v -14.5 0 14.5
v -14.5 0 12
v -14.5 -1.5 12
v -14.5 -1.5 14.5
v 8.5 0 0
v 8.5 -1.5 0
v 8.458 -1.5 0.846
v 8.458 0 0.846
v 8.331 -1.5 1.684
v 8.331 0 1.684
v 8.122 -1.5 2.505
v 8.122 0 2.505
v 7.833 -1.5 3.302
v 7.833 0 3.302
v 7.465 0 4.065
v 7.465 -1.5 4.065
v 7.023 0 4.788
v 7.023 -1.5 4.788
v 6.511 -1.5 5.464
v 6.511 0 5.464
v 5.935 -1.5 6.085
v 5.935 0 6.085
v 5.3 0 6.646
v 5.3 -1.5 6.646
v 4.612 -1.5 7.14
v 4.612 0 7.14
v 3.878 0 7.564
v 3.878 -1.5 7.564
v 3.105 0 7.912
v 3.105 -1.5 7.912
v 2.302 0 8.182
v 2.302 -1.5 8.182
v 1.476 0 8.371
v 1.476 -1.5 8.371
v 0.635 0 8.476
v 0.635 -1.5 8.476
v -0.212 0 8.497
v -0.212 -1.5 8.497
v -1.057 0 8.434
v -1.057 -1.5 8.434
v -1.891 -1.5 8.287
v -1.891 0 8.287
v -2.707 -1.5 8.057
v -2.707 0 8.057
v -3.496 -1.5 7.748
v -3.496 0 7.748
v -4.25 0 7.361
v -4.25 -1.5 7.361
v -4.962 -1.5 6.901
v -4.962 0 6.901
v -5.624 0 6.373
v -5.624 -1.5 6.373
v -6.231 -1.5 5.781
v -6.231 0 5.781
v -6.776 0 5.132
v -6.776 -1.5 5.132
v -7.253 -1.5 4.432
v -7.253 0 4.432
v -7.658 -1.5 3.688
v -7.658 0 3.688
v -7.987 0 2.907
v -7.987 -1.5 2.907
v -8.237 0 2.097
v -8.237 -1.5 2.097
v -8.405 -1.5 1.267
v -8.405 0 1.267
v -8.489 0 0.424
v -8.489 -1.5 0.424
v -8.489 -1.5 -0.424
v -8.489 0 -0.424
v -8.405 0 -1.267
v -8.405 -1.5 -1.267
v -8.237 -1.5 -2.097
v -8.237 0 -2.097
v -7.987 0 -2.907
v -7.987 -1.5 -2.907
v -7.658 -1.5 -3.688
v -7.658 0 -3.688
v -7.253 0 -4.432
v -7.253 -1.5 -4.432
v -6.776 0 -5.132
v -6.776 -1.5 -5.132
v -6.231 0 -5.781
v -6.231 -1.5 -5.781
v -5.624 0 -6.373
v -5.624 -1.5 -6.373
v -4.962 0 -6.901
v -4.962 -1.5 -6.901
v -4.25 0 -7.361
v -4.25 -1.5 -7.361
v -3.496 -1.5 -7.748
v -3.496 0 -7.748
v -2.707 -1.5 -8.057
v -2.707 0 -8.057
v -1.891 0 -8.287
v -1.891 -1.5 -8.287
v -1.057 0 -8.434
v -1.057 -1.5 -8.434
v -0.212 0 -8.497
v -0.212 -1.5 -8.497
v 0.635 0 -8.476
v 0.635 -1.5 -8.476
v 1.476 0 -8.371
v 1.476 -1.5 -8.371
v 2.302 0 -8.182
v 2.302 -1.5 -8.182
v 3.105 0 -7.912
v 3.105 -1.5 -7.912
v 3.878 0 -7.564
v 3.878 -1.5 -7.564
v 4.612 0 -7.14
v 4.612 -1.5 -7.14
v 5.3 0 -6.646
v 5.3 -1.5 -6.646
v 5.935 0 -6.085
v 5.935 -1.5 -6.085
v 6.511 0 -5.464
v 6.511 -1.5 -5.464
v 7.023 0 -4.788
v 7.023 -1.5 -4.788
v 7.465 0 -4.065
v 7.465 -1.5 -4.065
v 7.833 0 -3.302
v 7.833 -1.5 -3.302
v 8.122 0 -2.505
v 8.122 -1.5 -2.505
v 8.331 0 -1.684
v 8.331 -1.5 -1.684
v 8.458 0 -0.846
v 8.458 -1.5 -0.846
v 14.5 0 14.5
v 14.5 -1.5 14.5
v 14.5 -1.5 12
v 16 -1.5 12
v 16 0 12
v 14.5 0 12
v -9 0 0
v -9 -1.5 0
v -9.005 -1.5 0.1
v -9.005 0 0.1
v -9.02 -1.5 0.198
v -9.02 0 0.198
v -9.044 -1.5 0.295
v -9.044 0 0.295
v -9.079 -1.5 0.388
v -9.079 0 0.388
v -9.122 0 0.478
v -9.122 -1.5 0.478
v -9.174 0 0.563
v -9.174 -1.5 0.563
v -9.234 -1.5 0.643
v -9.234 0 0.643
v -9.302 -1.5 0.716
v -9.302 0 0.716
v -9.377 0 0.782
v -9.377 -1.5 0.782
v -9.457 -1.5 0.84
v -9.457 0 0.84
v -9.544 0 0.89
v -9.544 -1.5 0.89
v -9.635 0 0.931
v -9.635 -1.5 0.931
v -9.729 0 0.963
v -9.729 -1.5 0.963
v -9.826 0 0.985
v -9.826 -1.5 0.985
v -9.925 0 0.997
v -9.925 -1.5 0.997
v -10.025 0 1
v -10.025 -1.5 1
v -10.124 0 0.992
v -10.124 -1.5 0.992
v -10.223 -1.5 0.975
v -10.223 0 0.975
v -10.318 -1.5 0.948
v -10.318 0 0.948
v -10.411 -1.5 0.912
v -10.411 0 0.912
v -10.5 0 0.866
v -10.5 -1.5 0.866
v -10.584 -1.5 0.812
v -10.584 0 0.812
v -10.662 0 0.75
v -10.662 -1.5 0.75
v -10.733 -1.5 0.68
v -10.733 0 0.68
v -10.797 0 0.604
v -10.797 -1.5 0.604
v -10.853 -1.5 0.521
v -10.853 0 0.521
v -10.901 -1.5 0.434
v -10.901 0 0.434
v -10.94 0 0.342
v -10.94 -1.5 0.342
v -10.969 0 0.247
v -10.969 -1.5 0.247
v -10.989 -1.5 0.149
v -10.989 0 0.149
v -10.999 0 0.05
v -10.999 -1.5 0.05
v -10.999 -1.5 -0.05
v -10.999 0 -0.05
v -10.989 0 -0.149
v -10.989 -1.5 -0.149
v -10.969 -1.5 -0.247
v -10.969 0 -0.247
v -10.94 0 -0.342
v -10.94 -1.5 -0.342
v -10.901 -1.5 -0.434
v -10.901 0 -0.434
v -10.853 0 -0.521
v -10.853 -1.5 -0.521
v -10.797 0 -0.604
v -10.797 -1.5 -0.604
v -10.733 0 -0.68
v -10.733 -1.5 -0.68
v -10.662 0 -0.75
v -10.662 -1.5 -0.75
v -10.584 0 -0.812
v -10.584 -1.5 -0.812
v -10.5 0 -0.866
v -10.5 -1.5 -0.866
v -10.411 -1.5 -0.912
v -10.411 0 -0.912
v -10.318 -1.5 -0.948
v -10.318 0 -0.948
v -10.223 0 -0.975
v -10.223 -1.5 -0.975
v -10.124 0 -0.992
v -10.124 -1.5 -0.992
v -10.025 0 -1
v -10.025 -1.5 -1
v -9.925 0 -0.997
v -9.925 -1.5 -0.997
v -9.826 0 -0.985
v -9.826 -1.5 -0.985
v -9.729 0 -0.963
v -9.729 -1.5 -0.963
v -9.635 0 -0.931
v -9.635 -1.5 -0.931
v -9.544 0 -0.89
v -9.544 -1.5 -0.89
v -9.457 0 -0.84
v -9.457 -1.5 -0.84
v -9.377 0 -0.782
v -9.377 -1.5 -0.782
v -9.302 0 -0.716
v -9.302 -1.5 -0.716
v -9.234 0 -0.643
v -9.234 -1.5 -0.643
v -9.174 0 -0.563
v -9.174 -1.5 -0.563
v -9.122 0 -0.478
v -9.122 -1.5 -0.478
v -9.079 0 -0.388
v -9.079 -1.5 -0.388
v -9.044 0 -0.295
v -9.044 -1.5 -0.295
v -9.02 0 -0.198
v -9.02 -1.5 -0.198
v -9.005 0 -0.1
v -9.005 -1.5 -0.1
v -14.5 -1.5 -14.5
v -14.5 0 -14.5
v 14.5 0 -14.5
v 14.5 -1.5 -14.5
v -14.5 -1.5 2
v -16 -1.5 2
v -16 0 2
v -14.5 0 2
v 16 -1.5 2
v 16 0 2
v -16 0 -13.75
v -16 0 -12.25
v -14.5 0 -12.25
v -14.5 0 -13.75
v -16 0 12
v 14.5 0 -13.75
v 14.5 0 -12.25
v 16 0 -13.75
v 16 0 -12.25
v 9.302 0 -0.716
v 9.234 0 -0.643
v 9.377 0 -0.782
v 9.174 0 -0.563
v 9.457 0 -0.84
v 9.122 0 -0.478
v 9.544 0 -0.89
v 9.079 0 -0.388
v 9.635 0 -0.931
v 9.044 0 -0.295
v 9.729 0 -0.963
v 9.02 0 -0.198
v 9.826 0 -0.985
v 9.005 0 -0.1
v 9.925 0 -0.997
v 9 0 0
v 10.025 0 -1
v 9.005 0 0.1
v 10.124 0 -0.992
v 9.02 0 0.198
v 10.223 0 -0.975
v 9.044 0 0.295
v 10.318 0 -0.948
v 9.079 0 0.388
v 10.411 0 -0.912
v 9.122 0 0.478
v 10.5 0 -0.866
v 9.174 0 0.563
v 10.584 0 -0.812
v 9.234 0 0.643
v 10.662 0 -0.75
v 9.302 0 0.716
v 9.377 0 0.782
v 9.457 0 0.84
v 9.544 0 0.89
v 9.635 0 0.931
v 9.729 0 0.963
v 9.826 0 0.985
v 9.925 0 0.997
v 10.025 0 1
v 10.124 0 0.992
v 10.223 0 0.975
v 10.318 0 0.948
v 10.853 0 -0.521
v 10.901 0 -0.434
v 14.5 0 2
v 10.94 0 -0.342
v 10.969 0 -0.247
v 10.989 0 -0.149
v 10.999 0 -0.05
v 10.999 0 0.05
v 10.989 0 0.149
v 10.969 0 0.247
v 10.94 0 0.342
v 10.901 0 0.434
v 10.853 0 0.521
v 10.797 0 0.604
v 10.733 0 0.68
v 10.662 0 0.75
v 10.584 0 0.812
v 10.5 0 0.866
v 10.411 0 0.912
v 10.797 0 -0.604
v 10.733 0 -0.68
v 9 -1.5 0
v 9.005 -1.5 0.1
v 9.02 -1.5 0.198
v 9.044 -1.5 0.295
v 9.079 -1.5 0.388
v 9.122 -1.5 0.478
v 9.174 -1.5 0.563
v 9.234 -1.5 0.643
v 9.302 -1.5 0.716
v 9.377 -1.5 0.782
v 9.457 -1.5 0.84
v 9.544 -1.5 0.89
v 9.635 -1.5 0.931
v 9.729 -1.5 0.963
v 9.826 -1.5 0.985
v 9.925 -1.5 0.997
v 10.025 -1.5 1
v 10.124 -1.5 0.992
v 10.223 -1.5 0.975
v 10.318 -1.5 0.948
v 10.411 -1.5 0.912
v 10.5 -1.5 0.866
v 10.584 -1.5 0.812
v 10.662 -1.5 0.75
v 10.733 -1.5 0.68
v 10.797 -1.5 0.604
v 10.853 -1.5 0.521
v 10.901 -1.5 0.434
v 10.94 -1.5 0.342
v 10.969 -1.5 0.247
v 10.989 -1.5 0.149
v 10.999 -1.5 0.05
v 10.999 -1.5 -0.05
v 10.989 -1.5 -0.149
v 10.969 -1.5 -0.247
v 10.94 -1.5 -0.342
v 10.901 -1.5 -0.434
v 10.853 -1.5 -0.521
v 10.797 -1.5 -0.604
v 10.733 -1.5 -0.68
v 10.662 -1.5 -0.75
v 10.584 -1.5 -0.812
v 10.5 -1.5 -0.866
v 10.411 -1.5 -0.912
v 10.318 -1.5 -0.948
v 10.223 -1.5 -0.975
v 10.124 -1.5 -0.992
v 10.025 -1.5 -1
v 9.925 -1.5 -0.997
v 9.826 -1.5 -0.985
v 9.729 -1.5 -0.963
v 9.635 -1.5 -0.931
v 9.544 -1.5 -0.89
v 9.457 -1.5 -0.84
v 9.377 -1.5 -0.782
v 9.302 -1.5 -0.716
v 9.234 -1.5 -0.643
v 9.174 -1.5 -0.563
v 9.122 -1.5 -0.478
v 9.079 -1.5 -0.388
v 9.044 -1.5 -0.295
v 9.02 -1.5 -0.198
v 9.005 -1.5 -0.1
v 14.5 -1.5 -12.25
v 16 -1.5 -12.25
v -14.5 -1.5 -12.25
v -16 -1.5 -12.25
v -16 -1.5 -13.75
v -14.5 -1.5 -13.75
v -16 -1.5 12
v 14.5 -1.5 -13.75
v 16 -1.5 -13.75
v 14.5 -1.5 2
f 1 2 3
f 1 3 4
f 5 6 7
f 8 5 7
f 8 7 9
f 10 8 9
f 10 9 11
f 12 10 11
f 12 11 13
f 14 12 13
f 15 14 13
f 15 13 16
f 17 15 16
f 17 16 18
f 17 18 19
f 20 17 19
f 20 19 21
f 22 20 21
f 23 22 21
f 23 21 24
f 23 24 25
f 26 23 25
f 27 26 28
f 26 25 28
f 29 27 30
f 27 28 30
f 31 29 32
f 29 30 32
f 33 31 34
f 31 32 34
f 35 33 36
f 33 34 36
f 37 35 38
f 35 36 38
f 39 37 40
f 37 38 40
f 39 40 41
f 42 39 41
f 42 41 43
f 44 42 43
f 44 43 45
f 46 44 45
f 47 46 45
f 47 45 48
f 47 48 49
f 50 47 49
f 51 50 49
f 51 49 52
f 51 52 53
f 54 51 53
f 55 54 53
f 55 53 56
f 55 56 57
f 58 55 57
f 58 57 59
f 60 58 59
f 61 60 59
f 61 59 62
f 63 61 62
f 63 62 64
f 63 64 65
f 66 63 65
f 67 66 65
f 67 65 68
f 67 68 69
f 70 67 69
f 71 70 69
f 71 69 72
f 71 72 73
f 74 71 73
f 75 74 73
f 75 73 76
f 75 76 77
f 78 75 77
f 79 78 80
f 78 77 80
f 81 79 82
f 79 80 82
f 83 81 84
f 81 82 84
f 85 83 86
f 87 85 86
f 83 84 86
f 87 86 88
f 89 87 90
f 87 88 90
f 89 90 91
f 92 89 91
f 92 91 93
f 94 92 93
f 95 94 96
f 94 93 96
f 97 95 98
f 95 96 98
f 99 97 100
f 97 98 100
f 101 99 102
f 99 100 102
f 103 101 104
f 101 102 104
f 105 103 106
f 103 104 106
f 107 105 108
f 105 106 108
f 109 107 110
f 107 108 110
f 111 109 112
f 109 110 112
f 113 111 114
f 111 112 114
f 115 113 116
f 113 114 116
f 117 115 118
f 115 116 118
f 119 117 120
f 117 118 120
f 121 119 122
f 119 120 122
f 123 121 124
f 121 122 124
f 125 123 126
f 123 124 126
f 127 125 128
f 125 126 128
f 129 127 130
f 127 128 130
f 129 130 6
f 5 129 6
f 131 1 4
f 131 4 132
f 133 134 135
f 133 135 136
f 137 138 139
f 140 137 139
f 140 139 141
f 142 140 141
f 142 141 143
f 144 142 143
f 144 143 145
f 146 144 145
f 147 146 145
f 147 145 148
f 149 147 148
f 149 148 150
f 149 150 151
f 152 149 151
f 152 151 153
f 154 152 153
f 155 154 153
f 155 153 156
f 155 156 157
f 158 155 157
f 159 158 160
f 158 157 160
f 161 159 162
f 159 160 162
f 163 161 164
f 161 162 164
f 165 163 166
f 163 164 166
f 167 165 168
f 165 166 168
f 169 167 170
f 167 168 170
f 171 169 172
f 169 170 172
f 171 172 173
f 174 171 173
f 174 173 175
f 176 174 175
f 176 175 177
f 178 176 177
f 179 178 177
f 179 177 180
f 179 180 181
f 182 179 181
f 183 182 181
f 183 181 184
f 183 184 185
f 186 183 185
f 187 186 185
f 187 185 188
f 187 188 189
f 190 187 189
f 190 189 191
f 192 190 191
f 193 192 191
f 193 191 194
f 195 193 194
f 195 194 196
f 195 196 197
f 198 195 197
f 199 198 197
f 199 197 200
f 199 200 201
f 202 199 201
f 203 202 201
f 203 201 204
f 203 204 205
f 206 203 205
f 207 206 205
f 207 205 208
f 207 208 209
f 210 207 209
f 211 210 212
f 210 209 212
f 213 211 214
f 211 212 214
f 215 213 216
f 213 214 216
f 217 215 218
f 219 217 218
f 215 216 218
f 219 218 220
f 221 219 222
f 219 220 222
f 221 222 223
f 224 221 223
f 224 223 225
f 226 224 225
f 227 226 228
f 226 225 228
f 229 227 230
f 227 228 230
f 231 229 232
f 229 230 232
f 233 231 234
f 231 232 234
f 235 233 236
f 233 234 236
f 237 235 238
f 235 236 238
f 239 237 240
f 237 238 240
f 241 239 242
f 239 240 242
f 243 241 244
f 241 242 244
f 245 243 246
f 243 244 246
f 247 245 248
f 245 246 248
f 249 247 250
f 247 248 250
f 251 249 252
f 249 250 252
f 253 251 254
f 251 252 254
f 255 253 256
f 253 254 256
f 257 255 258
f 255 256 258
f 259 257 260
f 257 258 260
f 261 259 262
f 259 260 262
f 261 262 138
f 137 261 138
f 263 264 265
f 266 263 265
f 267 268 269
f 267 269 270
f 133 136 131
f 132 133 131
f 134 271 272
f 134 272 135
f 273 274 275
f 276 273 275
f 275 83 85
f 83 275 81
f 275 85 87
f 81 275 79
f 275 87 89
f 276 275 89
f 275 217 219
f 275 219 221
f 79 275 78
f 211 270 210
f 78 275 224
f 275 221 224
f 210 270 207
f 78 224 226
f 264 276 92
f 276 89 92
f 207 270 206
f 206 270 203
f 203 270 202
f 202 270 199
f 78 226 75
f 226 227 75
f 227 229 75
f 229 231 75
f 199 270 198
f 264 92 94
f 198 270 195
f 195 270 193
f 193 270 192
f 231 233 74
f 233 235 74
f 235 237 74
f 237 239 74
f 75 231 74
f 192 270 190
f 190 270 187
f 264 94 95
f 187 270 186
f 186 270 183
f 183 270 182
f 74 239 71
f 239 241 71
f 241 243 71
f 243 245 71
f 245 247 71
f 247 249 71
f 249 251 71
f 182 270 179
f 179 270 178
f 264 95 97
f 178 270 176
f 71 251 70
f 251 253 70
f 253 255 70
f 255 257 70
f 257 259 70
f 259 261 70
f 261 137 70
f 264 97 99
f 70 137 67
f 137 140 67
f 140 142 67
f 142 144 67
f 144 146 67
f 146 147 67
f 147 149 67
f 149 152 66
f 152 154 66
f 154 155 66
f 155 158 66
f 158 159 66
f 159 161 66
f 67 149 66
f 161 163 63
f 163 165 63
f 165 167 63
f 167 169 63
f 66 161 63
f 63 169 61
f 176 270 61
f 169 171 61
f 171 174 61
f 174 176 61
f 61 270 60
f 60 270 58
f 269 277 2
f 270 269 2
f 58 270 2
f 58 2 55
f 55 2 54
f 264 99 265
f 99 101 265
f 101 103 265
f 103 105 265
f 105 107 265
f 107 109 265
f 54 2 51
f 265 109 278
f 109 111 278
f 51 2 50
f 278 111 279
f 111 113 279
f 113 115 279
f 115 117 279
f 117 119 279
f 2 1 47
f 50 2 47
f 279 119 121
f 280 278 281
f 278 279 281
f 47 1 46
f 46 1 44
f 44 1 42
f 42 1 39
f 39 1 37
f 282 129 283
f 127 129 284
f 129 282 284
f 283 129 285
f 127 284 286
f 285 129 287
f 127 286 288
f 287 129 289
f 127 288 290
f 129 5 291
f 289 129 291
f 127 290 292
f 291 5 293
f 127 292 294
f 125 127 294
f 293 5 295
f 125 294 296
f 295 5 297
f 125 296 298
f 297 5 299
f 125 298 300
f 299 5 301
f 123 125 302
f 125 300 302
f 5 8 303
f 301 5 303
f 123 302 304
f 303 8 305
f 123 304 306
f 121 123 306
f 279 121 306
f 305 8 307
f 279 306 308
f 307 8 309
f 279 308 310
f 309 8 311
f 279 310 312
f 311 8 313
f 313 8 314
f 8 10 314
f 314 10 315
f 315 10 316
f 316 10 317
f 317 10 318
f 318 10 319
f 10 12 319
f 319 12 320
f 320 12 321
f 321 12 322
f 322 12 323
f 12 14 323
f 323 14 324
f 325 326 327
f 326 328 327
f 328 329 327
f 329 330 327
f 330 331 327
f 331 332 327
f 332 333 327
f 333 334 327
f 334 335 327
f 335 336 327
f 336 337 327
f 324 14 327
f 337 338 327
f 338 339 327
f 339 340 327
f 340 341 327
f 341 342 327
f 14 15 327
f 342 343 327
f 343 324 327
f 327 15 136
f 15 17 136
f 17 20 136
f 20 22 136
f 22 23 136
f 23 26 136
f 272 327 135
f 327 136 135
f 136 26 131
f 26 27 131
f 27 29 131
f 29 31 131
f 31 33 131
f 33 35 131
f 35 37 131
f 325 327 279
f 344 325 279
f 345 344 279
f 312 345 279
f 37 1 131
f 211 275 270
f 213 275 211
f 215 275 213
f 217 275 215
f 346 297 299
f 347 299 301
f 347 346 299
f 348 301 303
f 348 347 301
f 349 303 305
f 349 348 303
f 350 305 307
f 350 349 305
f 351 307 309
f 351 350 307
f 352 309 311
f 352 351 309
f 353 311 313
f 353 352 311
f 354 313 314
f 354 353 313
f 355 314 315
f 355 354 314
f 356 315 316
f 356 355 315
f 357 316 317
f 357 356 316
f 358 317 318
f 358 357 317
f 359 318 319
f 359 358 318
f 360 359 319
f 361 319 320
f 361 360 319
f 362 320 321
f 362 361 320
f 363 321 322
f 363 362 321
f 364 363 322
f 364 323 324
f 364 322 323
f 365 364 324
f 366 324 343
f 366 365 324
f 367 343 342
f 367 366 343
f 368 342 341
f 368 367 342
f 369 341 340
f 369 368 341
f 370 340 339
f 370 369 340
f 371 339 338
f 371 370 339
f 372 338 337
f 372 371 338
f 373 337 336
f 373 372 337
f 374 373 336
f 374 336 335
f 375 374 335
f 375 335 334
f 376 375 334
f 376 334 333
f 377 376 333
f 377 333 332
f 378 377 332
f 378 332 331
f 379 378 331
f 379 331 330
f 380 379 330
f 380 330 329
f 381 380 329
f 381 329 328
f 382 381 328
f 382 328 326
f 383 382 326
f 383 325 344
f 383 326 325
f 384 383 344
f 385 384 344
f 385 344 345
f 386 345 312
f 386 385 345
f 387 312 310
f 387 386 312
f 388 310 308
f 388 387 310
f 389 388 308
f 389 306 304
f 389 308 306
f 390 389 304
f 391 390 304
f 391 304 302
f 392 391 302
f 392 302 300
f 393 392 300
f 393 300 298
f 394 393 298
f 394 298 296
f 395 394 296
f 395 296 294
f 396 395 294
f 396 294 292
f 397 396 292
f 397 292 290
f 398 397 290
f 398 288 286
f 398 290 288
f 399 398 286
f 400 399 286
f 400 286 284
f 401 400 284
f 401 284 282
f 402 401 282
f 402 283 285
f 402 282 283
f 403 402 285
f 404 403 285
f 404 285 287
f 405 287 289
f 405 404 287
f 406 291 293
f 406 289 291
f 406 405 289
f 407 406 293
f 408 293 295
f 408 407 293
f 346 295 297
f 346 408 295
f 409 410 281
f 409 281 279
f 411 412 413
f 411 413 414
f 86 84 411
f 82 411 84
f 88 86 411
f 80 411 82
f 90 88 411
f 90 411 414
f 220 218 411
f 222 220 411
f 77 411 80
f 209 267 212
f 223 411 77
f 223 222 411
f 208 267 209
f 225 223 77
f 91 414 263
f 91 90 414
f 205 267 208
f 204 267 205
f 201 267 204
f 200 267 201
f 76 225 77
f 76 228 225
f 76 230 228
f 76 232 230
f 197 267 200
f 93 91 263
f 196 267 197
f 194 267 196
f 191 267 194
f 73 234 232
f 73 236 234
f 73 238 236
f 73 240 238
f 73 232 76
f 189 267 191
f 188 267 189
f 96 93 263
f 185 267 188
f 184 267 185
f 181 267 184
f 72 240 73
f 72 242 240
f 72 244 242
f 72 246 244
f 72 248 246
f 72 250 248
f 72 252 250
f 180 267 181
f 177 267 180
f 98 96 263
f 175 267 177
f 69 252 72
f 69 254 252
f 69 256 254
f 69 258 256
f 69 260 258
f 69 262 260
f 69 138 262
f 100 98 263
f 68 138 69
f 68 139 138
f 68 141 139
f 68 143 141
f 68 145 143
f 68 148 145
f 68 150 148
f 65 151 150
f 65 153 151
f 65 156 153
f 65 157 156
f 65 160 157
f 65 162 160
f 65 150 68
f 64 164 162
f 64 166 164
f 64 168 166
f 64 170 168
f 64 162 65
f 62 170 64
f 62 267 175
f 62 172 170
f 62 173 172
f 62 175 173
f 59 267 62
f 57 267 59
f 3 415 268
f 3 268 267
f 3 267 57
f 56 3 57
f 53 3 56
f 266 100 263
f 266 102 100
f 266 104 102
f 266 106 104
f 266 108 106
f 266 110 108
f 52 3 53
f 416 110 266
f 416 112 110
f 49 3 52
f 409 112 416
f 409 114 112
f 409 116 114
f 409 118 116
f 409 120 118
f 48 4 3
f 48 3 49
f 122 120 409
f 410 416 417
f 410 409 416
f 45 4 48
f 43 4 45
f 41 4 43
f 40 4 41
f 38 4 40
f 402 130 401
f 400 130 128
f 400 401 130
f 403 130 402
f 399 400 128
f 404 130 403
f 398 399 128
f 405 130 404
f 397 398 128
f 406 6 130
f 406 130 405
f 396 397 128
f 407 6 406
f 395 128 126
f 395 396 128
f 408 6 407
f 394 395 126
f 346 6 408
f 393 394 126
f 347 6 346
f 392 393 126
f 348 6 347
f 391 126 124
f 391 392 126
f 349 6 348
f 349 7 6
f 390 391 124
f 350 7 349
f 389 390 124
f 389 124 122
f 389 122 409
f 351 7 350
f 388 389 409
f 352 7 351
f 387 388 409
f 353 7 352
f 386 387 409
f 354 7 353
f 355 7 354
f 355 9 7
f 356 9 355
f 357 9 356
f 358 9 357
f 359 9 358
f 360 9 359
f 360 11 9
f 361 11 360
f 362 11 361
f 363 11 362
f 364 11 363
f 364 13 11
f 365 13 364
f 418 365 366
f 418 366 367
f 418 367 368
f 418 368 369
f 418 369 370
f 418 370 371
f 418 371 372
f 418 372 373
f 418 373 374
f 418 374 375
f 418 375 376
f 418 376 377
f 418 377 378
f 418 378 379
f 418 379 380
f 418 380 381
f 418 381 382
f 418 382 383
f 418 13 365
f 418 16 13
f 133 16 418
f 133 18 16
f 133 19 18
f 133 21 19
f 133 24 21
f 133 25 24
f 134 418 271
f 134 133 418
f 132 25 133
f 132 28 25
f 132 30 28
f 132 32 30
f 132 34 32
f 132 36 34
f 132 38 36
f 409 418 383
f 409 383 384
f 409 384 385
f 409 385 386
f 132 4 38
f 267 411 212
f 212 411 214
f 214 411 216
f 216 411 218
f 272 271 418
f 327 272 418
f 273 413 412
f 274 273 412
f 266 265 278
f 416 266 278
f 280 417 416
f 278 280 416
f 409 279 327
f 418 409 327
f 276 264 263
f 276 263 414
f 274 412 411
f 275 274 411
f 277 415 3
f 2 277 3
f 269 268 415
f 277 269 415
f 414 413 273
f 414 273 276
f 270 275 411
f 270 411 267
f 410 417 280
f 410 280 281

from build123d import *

# Parameters (mm, degrees)
F0_W     = 29
F0_H     = 29
F1_DEPTH = 1.5
F2_R     = 8.5
F3_DEPTH = 1.501
F4_R     = 1
F5_DEPTH = 1.501
F6_W     = 1.5
F6_H     = 1.5
F6_H_2   = 10
F7_DEPTH = 1.5


# Not quite as in the source:
# - a pattern or mirror of a feature is missing from the dataset's text; its kind, count and spacing are read off the source's solid


with BuildPart() as f1:
    # F0 (on Front) → F1 (new body)
    with BuildSketch(Plane.XZ):
        Rectangle(F0_W, F0_H)
    extrude(amount=F1_DEPTH)

    # F2 (on face) → F3 (cut, through all)
    with BuildSketch(Plane.XZ.offset(1.5)):
        Circle(F2_R)
    extrude(amount=-F3_DEPTH, mode=Mode.SUBTRACT)

    # F4 (on face) → F5 (cut, through all)
    with BuildSketch(Plane.XZ.offset(1.5)):
        with Locations((-10, 0)):
            Circle(F4_R)
    f5 = extrude(amount=-F5_DEPTH, mode=Mode.SUBTRACT)

    # F5_copies: F5 across plane
    add(f5.mirror(Plane(origin=(0, 0, 0), x_dir=(0, 0, 1), z_dir=(1, 0, 0))), mode=Mode.SUBTRACT)

    # F6 (on face) → F7 (join)
    with BuildSketch(Plane.XZ.offset(1.5)):
        with Locations((-15.25, -13)):
            Rectangle(F6_W, F6_H)
        with Locations((-15.25, 7)):
            Rectangle(F6_W, F6_H_2)
    f7 = extrude(amount=-F7_DEPTH)

    # F7_copies: F7 across plane
    add(f7.mirror(Plane(origin=(0, 0, 0), x_dir=(0, 0, 1), z_dir=(1, 0, 0))))


solid = f1.part
